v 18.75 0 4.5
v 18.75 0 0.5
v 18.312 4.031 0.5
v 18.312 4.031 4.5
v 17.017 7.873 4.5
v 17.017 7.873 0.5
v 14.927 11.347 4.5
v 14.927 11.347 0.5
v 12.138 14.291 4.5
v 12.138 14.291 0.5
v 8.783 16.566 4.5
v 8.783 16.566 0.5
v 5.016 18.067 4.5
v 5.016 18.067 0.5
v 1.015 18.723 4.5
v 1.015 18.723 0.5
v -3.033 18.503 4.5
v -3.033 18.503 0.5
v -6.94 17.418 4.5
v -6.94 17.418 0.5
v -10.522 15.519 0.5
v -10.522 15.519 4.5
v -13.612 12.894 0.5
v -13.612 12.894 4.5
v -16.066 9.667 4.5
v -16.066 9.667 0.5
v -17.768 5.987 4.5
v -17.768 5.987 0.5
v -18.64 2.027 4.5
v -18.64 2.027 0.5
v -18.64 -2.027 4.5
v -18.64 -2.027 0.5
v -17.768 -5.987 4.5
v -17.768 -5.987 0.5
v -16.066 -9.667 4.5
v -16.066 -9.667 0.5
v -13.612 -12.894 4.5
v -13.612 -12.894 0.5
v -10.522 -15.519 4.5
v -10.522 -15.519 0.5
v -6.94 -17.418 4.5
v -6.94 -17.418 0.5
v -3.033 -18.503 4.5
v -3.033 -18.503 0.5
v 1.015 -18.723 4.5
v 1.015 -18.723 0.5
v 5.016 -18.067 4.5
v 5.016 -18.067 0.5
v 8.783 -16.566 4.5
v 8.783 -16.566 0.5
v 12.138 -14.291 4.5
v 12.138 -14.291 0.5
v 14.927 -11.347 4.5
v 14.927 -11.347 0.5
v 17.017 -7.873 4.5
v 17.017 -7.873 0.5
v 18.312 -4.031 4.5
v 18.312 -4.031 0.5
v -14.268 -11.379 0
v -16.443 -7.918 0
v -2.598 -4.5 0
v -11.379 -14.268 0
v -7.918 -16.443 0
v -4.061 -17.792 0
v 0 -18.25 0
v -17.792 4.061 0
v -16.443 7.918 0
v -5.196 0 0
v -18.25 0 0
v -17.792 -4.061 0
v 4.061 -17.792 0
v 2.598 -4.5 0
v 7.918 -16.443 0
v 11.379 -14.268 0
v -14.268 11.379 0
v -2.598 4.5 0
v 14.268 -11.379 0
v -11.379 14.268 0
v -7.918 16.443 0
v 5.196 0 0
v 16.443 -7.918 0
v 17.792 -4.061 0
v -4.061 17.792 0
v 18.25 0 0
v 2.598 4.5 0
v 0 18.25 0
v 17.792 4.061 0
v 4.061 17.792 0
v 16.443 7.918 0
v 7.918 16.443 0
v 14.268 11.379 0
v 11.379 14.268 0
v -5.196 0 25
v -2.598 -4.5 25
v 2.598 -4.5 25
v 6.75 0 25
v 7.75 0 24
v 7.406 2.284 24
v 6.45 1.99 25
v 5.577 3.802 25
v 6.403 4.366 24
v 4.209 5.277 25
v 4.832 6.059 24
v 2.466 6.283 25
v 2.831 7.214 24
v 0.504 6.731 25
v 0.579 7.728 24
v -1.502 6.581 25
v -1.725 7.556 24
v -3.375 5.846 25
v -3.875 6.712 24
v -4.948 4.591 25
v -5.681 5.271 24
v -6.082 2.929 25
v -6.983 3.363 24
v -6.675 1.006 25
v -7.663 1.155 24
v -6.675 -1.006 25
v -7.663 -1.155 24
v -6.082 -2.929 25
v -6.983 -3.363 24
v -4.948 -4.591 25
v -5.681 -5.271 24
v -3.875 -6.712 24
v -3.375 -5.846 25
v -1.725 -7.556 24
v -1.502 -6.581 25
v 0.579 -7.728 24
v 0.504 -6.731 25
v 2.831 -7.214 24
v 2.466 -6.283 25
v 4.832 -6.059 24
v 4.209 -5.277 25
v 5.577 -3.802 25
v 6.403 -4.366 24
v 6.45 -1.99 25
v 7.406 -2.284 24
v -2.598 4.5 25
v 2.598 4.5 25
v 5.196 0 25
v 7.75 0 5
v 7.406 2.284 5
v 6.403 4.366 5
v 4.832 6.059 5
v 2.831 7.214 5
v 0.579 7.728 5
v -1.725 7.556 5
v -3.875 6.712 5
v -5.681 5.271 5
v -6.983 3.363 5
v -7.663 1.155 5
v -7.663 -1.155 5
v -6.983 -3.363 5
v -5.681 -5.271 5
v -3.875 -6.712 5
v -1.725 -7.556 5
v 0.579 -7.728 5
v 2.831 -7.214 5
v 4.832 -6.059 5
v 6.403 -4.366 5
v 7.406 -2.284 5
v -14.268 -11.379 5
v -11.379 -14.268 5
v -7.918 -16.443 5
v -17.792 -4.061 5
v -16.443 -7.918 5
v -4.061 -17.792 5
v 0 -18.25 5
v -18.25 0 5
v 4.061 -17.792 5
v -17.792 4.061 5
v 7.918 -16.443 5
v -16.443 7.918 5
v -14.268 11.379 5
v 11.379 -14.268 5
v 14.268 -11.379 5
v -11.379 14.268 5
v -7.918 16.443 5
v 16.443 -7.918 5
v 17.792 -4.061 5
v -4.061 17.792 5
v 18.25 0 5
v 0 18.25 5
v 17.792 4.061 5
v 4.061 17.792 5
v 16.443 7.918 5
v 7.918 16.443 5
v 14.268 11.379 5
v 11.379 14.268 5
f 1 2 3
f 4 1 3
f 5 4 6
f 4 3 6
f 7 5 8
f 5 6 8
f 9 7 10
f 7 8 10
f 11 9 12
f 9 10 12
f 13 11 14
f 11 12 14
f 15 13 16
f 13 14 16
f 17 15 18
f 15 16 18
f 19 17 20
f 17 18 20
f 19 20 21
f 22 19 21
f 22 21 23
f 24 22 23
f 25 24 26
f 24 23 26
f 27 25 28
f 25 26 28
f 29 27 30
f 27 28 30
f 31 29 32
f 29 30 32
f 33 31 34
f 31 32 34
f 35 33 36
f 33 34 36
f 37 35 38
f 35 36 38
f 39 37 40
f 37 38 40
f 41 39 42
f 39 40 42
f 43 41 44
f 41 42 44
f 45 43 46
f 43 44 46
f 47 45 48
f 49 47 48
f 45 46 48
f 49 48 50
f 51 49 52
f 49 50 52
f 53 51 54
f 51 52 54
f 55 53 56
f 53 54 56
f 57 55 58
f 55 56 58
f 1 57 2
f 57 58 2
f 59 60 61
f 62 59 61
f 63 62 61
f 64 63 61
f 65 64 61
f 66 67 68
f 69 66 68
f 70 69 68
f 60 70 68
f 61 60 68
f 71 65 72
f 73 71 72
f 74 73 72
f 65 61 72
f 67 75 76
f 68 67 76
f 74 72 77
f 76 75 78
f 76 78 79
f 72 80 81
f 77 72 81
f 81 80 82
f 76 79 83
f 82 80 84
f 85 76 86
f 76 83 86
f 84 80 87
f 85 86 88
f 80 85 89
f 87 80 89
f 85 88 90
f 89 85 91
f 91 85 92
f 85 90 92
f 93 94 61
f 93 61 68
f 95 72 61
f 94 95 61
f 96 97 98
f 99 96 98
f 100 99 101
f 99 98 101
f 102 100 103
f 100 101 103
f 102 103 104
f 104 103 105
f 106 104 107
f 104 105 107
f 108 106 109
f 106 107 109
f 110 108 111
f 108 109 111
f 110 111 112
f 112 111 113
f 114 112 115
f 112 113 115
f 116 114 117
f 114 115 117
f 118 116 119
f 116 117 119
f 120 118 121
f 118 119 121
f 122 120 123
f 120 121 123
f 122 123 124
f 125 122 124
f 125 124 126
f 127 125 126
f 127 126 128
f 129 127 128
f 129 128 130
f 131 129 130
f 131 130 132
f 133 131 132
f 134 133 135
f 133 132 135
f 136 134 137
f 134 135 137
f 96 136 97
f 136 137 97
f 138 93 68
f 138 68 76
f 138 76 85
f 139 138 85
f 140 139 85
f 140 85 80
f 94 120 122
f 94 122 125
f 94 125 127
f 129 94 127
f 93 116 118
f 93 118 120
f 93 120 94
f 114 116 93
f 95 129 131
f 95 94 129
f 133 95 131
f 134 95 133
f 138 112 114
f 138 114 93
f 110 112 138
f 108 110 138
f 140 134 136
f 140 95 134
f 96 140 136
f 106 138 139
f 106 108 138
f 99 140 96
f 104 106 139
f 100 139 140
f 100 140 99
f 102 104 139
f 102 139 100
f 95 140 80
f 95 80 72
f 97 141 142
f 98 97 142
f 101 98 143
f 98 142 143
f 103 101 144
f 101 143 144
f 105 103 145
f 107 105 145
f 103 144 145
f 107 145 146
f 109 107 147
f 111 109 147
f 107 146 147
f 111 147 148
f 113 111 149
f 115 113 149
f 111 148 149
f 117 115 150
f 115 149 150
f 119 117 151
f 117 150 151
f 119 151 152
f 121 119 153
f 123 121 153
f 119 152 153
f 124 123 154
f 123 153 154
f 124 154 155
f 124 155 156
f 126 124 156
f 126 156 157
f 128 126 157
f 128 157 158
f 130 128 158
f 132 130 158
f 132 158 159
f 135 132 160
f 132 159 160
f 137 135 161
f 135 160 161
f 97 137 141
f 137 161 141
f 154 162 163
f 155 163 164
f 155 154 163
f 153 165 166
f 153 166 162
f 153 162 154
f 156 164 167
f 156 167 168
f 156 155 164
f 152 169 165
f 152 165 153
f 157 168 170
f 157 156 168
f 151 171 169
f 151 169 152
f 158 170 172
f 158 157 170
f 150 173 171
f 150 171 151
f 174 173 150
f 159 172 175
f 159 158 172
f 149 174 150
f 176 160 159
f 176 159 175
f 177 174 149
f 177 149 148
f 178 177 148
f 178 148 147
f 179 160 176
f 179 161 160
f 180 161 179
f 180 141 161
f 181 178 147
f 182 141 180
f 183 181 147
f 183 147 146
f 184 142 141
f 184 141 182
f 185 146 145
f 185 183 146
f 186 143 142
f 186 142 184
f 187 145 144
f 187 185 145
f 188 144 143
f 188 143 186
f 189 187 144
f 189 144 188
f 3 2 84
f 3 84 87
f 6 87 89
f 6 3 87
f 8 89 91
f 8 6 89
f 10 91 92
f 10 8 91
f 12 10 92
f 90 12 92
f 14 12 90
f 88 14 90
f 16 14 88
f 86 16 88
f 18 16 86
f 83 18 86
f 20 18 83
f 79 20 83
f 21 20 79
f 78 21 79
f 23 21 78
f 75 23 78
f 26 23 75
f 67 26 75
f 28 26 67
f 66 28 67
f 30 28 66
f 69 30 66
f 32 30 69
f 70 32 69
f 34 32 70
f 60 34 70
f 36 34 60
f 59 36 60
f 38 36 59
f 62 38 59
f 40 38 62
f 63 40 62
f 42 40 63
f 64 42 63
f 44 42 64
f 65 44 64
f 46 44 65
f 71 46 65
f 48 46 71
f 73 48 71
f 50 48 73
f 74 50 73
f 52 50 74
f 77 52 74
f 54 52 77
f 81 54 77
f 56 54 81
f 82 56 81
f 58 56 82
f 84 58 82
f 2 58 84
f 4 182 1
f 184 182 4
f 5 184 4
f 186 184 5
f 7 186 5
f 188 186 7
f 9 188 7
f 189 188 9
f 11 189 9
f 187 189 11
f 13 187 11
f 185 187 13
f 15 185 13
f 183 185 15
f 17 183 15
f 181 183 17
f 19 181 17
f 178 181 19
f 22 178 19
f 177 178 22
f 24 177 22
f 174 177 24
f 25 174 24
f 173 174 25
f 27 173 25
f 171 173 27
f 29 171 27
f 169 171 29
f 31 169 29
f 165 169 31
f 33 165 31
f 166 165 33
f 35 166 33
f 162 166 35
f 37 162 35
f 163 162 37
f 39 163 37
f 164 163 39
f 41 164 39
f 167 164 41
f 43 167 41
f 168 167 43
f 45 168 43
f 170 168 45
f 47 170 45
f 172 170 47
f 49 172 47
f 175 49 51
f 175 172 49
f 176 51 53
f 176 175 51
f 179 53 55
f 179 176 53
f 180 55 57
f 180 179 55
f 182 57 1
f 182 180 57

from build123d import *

# Parameters (mm, degrees)
F0_R     = 18.75
F1_DEPTH = 5
F2_R     = 7.75
F3_DEPTH = 20
F4_SIZE  = 0.5
F5_SIZE  = 1


with BuildPart() as f1:
    # F0 (on Top) → F1 (new body)
    with BuildSketch(Plane.XY):
        Circle(F0_R)
        Polygon((2.598076, 4.5), (5.196152, 0), (2.598076, -4.5), (-2.598076, -4.5), (-5.196152, 0), (-2.598076, 4.5), align=None, mode=Mode.SUBTRACT)
    extrude(amount=F1_DEPTH)

    # F2 (on face) → F3 (join)
    with BuildSketch(Plane.XY.offset(5)):
        Circle(F2_R)
        Polygon((-2.598076, -4.5), (-5.196152, 0), (-2.598076, 4.5), (2.598076, 4.5), (5.196152, 0), (2.598076, -4.5), align=None, mode=Mode.SUBTRACT)
    extrude(amount=F3_DEPTH)

    # F4
    f4_edges = [f1.edges().sort_by_distance(p)[0] for p in [
        (-18.75, 0, 0),
        (-18.75, 0, 5),
    ]]
    chamfer(f4_edges, length=F4_SIZE)

    # F5
    f5_edges = [f1.edges().sort_by_distance(p)[0] for p in [
        (-7.75, 0, 25),
    ]]
    chamfer(f5_edges, length=F5_SIZE)


solid = f1.part
